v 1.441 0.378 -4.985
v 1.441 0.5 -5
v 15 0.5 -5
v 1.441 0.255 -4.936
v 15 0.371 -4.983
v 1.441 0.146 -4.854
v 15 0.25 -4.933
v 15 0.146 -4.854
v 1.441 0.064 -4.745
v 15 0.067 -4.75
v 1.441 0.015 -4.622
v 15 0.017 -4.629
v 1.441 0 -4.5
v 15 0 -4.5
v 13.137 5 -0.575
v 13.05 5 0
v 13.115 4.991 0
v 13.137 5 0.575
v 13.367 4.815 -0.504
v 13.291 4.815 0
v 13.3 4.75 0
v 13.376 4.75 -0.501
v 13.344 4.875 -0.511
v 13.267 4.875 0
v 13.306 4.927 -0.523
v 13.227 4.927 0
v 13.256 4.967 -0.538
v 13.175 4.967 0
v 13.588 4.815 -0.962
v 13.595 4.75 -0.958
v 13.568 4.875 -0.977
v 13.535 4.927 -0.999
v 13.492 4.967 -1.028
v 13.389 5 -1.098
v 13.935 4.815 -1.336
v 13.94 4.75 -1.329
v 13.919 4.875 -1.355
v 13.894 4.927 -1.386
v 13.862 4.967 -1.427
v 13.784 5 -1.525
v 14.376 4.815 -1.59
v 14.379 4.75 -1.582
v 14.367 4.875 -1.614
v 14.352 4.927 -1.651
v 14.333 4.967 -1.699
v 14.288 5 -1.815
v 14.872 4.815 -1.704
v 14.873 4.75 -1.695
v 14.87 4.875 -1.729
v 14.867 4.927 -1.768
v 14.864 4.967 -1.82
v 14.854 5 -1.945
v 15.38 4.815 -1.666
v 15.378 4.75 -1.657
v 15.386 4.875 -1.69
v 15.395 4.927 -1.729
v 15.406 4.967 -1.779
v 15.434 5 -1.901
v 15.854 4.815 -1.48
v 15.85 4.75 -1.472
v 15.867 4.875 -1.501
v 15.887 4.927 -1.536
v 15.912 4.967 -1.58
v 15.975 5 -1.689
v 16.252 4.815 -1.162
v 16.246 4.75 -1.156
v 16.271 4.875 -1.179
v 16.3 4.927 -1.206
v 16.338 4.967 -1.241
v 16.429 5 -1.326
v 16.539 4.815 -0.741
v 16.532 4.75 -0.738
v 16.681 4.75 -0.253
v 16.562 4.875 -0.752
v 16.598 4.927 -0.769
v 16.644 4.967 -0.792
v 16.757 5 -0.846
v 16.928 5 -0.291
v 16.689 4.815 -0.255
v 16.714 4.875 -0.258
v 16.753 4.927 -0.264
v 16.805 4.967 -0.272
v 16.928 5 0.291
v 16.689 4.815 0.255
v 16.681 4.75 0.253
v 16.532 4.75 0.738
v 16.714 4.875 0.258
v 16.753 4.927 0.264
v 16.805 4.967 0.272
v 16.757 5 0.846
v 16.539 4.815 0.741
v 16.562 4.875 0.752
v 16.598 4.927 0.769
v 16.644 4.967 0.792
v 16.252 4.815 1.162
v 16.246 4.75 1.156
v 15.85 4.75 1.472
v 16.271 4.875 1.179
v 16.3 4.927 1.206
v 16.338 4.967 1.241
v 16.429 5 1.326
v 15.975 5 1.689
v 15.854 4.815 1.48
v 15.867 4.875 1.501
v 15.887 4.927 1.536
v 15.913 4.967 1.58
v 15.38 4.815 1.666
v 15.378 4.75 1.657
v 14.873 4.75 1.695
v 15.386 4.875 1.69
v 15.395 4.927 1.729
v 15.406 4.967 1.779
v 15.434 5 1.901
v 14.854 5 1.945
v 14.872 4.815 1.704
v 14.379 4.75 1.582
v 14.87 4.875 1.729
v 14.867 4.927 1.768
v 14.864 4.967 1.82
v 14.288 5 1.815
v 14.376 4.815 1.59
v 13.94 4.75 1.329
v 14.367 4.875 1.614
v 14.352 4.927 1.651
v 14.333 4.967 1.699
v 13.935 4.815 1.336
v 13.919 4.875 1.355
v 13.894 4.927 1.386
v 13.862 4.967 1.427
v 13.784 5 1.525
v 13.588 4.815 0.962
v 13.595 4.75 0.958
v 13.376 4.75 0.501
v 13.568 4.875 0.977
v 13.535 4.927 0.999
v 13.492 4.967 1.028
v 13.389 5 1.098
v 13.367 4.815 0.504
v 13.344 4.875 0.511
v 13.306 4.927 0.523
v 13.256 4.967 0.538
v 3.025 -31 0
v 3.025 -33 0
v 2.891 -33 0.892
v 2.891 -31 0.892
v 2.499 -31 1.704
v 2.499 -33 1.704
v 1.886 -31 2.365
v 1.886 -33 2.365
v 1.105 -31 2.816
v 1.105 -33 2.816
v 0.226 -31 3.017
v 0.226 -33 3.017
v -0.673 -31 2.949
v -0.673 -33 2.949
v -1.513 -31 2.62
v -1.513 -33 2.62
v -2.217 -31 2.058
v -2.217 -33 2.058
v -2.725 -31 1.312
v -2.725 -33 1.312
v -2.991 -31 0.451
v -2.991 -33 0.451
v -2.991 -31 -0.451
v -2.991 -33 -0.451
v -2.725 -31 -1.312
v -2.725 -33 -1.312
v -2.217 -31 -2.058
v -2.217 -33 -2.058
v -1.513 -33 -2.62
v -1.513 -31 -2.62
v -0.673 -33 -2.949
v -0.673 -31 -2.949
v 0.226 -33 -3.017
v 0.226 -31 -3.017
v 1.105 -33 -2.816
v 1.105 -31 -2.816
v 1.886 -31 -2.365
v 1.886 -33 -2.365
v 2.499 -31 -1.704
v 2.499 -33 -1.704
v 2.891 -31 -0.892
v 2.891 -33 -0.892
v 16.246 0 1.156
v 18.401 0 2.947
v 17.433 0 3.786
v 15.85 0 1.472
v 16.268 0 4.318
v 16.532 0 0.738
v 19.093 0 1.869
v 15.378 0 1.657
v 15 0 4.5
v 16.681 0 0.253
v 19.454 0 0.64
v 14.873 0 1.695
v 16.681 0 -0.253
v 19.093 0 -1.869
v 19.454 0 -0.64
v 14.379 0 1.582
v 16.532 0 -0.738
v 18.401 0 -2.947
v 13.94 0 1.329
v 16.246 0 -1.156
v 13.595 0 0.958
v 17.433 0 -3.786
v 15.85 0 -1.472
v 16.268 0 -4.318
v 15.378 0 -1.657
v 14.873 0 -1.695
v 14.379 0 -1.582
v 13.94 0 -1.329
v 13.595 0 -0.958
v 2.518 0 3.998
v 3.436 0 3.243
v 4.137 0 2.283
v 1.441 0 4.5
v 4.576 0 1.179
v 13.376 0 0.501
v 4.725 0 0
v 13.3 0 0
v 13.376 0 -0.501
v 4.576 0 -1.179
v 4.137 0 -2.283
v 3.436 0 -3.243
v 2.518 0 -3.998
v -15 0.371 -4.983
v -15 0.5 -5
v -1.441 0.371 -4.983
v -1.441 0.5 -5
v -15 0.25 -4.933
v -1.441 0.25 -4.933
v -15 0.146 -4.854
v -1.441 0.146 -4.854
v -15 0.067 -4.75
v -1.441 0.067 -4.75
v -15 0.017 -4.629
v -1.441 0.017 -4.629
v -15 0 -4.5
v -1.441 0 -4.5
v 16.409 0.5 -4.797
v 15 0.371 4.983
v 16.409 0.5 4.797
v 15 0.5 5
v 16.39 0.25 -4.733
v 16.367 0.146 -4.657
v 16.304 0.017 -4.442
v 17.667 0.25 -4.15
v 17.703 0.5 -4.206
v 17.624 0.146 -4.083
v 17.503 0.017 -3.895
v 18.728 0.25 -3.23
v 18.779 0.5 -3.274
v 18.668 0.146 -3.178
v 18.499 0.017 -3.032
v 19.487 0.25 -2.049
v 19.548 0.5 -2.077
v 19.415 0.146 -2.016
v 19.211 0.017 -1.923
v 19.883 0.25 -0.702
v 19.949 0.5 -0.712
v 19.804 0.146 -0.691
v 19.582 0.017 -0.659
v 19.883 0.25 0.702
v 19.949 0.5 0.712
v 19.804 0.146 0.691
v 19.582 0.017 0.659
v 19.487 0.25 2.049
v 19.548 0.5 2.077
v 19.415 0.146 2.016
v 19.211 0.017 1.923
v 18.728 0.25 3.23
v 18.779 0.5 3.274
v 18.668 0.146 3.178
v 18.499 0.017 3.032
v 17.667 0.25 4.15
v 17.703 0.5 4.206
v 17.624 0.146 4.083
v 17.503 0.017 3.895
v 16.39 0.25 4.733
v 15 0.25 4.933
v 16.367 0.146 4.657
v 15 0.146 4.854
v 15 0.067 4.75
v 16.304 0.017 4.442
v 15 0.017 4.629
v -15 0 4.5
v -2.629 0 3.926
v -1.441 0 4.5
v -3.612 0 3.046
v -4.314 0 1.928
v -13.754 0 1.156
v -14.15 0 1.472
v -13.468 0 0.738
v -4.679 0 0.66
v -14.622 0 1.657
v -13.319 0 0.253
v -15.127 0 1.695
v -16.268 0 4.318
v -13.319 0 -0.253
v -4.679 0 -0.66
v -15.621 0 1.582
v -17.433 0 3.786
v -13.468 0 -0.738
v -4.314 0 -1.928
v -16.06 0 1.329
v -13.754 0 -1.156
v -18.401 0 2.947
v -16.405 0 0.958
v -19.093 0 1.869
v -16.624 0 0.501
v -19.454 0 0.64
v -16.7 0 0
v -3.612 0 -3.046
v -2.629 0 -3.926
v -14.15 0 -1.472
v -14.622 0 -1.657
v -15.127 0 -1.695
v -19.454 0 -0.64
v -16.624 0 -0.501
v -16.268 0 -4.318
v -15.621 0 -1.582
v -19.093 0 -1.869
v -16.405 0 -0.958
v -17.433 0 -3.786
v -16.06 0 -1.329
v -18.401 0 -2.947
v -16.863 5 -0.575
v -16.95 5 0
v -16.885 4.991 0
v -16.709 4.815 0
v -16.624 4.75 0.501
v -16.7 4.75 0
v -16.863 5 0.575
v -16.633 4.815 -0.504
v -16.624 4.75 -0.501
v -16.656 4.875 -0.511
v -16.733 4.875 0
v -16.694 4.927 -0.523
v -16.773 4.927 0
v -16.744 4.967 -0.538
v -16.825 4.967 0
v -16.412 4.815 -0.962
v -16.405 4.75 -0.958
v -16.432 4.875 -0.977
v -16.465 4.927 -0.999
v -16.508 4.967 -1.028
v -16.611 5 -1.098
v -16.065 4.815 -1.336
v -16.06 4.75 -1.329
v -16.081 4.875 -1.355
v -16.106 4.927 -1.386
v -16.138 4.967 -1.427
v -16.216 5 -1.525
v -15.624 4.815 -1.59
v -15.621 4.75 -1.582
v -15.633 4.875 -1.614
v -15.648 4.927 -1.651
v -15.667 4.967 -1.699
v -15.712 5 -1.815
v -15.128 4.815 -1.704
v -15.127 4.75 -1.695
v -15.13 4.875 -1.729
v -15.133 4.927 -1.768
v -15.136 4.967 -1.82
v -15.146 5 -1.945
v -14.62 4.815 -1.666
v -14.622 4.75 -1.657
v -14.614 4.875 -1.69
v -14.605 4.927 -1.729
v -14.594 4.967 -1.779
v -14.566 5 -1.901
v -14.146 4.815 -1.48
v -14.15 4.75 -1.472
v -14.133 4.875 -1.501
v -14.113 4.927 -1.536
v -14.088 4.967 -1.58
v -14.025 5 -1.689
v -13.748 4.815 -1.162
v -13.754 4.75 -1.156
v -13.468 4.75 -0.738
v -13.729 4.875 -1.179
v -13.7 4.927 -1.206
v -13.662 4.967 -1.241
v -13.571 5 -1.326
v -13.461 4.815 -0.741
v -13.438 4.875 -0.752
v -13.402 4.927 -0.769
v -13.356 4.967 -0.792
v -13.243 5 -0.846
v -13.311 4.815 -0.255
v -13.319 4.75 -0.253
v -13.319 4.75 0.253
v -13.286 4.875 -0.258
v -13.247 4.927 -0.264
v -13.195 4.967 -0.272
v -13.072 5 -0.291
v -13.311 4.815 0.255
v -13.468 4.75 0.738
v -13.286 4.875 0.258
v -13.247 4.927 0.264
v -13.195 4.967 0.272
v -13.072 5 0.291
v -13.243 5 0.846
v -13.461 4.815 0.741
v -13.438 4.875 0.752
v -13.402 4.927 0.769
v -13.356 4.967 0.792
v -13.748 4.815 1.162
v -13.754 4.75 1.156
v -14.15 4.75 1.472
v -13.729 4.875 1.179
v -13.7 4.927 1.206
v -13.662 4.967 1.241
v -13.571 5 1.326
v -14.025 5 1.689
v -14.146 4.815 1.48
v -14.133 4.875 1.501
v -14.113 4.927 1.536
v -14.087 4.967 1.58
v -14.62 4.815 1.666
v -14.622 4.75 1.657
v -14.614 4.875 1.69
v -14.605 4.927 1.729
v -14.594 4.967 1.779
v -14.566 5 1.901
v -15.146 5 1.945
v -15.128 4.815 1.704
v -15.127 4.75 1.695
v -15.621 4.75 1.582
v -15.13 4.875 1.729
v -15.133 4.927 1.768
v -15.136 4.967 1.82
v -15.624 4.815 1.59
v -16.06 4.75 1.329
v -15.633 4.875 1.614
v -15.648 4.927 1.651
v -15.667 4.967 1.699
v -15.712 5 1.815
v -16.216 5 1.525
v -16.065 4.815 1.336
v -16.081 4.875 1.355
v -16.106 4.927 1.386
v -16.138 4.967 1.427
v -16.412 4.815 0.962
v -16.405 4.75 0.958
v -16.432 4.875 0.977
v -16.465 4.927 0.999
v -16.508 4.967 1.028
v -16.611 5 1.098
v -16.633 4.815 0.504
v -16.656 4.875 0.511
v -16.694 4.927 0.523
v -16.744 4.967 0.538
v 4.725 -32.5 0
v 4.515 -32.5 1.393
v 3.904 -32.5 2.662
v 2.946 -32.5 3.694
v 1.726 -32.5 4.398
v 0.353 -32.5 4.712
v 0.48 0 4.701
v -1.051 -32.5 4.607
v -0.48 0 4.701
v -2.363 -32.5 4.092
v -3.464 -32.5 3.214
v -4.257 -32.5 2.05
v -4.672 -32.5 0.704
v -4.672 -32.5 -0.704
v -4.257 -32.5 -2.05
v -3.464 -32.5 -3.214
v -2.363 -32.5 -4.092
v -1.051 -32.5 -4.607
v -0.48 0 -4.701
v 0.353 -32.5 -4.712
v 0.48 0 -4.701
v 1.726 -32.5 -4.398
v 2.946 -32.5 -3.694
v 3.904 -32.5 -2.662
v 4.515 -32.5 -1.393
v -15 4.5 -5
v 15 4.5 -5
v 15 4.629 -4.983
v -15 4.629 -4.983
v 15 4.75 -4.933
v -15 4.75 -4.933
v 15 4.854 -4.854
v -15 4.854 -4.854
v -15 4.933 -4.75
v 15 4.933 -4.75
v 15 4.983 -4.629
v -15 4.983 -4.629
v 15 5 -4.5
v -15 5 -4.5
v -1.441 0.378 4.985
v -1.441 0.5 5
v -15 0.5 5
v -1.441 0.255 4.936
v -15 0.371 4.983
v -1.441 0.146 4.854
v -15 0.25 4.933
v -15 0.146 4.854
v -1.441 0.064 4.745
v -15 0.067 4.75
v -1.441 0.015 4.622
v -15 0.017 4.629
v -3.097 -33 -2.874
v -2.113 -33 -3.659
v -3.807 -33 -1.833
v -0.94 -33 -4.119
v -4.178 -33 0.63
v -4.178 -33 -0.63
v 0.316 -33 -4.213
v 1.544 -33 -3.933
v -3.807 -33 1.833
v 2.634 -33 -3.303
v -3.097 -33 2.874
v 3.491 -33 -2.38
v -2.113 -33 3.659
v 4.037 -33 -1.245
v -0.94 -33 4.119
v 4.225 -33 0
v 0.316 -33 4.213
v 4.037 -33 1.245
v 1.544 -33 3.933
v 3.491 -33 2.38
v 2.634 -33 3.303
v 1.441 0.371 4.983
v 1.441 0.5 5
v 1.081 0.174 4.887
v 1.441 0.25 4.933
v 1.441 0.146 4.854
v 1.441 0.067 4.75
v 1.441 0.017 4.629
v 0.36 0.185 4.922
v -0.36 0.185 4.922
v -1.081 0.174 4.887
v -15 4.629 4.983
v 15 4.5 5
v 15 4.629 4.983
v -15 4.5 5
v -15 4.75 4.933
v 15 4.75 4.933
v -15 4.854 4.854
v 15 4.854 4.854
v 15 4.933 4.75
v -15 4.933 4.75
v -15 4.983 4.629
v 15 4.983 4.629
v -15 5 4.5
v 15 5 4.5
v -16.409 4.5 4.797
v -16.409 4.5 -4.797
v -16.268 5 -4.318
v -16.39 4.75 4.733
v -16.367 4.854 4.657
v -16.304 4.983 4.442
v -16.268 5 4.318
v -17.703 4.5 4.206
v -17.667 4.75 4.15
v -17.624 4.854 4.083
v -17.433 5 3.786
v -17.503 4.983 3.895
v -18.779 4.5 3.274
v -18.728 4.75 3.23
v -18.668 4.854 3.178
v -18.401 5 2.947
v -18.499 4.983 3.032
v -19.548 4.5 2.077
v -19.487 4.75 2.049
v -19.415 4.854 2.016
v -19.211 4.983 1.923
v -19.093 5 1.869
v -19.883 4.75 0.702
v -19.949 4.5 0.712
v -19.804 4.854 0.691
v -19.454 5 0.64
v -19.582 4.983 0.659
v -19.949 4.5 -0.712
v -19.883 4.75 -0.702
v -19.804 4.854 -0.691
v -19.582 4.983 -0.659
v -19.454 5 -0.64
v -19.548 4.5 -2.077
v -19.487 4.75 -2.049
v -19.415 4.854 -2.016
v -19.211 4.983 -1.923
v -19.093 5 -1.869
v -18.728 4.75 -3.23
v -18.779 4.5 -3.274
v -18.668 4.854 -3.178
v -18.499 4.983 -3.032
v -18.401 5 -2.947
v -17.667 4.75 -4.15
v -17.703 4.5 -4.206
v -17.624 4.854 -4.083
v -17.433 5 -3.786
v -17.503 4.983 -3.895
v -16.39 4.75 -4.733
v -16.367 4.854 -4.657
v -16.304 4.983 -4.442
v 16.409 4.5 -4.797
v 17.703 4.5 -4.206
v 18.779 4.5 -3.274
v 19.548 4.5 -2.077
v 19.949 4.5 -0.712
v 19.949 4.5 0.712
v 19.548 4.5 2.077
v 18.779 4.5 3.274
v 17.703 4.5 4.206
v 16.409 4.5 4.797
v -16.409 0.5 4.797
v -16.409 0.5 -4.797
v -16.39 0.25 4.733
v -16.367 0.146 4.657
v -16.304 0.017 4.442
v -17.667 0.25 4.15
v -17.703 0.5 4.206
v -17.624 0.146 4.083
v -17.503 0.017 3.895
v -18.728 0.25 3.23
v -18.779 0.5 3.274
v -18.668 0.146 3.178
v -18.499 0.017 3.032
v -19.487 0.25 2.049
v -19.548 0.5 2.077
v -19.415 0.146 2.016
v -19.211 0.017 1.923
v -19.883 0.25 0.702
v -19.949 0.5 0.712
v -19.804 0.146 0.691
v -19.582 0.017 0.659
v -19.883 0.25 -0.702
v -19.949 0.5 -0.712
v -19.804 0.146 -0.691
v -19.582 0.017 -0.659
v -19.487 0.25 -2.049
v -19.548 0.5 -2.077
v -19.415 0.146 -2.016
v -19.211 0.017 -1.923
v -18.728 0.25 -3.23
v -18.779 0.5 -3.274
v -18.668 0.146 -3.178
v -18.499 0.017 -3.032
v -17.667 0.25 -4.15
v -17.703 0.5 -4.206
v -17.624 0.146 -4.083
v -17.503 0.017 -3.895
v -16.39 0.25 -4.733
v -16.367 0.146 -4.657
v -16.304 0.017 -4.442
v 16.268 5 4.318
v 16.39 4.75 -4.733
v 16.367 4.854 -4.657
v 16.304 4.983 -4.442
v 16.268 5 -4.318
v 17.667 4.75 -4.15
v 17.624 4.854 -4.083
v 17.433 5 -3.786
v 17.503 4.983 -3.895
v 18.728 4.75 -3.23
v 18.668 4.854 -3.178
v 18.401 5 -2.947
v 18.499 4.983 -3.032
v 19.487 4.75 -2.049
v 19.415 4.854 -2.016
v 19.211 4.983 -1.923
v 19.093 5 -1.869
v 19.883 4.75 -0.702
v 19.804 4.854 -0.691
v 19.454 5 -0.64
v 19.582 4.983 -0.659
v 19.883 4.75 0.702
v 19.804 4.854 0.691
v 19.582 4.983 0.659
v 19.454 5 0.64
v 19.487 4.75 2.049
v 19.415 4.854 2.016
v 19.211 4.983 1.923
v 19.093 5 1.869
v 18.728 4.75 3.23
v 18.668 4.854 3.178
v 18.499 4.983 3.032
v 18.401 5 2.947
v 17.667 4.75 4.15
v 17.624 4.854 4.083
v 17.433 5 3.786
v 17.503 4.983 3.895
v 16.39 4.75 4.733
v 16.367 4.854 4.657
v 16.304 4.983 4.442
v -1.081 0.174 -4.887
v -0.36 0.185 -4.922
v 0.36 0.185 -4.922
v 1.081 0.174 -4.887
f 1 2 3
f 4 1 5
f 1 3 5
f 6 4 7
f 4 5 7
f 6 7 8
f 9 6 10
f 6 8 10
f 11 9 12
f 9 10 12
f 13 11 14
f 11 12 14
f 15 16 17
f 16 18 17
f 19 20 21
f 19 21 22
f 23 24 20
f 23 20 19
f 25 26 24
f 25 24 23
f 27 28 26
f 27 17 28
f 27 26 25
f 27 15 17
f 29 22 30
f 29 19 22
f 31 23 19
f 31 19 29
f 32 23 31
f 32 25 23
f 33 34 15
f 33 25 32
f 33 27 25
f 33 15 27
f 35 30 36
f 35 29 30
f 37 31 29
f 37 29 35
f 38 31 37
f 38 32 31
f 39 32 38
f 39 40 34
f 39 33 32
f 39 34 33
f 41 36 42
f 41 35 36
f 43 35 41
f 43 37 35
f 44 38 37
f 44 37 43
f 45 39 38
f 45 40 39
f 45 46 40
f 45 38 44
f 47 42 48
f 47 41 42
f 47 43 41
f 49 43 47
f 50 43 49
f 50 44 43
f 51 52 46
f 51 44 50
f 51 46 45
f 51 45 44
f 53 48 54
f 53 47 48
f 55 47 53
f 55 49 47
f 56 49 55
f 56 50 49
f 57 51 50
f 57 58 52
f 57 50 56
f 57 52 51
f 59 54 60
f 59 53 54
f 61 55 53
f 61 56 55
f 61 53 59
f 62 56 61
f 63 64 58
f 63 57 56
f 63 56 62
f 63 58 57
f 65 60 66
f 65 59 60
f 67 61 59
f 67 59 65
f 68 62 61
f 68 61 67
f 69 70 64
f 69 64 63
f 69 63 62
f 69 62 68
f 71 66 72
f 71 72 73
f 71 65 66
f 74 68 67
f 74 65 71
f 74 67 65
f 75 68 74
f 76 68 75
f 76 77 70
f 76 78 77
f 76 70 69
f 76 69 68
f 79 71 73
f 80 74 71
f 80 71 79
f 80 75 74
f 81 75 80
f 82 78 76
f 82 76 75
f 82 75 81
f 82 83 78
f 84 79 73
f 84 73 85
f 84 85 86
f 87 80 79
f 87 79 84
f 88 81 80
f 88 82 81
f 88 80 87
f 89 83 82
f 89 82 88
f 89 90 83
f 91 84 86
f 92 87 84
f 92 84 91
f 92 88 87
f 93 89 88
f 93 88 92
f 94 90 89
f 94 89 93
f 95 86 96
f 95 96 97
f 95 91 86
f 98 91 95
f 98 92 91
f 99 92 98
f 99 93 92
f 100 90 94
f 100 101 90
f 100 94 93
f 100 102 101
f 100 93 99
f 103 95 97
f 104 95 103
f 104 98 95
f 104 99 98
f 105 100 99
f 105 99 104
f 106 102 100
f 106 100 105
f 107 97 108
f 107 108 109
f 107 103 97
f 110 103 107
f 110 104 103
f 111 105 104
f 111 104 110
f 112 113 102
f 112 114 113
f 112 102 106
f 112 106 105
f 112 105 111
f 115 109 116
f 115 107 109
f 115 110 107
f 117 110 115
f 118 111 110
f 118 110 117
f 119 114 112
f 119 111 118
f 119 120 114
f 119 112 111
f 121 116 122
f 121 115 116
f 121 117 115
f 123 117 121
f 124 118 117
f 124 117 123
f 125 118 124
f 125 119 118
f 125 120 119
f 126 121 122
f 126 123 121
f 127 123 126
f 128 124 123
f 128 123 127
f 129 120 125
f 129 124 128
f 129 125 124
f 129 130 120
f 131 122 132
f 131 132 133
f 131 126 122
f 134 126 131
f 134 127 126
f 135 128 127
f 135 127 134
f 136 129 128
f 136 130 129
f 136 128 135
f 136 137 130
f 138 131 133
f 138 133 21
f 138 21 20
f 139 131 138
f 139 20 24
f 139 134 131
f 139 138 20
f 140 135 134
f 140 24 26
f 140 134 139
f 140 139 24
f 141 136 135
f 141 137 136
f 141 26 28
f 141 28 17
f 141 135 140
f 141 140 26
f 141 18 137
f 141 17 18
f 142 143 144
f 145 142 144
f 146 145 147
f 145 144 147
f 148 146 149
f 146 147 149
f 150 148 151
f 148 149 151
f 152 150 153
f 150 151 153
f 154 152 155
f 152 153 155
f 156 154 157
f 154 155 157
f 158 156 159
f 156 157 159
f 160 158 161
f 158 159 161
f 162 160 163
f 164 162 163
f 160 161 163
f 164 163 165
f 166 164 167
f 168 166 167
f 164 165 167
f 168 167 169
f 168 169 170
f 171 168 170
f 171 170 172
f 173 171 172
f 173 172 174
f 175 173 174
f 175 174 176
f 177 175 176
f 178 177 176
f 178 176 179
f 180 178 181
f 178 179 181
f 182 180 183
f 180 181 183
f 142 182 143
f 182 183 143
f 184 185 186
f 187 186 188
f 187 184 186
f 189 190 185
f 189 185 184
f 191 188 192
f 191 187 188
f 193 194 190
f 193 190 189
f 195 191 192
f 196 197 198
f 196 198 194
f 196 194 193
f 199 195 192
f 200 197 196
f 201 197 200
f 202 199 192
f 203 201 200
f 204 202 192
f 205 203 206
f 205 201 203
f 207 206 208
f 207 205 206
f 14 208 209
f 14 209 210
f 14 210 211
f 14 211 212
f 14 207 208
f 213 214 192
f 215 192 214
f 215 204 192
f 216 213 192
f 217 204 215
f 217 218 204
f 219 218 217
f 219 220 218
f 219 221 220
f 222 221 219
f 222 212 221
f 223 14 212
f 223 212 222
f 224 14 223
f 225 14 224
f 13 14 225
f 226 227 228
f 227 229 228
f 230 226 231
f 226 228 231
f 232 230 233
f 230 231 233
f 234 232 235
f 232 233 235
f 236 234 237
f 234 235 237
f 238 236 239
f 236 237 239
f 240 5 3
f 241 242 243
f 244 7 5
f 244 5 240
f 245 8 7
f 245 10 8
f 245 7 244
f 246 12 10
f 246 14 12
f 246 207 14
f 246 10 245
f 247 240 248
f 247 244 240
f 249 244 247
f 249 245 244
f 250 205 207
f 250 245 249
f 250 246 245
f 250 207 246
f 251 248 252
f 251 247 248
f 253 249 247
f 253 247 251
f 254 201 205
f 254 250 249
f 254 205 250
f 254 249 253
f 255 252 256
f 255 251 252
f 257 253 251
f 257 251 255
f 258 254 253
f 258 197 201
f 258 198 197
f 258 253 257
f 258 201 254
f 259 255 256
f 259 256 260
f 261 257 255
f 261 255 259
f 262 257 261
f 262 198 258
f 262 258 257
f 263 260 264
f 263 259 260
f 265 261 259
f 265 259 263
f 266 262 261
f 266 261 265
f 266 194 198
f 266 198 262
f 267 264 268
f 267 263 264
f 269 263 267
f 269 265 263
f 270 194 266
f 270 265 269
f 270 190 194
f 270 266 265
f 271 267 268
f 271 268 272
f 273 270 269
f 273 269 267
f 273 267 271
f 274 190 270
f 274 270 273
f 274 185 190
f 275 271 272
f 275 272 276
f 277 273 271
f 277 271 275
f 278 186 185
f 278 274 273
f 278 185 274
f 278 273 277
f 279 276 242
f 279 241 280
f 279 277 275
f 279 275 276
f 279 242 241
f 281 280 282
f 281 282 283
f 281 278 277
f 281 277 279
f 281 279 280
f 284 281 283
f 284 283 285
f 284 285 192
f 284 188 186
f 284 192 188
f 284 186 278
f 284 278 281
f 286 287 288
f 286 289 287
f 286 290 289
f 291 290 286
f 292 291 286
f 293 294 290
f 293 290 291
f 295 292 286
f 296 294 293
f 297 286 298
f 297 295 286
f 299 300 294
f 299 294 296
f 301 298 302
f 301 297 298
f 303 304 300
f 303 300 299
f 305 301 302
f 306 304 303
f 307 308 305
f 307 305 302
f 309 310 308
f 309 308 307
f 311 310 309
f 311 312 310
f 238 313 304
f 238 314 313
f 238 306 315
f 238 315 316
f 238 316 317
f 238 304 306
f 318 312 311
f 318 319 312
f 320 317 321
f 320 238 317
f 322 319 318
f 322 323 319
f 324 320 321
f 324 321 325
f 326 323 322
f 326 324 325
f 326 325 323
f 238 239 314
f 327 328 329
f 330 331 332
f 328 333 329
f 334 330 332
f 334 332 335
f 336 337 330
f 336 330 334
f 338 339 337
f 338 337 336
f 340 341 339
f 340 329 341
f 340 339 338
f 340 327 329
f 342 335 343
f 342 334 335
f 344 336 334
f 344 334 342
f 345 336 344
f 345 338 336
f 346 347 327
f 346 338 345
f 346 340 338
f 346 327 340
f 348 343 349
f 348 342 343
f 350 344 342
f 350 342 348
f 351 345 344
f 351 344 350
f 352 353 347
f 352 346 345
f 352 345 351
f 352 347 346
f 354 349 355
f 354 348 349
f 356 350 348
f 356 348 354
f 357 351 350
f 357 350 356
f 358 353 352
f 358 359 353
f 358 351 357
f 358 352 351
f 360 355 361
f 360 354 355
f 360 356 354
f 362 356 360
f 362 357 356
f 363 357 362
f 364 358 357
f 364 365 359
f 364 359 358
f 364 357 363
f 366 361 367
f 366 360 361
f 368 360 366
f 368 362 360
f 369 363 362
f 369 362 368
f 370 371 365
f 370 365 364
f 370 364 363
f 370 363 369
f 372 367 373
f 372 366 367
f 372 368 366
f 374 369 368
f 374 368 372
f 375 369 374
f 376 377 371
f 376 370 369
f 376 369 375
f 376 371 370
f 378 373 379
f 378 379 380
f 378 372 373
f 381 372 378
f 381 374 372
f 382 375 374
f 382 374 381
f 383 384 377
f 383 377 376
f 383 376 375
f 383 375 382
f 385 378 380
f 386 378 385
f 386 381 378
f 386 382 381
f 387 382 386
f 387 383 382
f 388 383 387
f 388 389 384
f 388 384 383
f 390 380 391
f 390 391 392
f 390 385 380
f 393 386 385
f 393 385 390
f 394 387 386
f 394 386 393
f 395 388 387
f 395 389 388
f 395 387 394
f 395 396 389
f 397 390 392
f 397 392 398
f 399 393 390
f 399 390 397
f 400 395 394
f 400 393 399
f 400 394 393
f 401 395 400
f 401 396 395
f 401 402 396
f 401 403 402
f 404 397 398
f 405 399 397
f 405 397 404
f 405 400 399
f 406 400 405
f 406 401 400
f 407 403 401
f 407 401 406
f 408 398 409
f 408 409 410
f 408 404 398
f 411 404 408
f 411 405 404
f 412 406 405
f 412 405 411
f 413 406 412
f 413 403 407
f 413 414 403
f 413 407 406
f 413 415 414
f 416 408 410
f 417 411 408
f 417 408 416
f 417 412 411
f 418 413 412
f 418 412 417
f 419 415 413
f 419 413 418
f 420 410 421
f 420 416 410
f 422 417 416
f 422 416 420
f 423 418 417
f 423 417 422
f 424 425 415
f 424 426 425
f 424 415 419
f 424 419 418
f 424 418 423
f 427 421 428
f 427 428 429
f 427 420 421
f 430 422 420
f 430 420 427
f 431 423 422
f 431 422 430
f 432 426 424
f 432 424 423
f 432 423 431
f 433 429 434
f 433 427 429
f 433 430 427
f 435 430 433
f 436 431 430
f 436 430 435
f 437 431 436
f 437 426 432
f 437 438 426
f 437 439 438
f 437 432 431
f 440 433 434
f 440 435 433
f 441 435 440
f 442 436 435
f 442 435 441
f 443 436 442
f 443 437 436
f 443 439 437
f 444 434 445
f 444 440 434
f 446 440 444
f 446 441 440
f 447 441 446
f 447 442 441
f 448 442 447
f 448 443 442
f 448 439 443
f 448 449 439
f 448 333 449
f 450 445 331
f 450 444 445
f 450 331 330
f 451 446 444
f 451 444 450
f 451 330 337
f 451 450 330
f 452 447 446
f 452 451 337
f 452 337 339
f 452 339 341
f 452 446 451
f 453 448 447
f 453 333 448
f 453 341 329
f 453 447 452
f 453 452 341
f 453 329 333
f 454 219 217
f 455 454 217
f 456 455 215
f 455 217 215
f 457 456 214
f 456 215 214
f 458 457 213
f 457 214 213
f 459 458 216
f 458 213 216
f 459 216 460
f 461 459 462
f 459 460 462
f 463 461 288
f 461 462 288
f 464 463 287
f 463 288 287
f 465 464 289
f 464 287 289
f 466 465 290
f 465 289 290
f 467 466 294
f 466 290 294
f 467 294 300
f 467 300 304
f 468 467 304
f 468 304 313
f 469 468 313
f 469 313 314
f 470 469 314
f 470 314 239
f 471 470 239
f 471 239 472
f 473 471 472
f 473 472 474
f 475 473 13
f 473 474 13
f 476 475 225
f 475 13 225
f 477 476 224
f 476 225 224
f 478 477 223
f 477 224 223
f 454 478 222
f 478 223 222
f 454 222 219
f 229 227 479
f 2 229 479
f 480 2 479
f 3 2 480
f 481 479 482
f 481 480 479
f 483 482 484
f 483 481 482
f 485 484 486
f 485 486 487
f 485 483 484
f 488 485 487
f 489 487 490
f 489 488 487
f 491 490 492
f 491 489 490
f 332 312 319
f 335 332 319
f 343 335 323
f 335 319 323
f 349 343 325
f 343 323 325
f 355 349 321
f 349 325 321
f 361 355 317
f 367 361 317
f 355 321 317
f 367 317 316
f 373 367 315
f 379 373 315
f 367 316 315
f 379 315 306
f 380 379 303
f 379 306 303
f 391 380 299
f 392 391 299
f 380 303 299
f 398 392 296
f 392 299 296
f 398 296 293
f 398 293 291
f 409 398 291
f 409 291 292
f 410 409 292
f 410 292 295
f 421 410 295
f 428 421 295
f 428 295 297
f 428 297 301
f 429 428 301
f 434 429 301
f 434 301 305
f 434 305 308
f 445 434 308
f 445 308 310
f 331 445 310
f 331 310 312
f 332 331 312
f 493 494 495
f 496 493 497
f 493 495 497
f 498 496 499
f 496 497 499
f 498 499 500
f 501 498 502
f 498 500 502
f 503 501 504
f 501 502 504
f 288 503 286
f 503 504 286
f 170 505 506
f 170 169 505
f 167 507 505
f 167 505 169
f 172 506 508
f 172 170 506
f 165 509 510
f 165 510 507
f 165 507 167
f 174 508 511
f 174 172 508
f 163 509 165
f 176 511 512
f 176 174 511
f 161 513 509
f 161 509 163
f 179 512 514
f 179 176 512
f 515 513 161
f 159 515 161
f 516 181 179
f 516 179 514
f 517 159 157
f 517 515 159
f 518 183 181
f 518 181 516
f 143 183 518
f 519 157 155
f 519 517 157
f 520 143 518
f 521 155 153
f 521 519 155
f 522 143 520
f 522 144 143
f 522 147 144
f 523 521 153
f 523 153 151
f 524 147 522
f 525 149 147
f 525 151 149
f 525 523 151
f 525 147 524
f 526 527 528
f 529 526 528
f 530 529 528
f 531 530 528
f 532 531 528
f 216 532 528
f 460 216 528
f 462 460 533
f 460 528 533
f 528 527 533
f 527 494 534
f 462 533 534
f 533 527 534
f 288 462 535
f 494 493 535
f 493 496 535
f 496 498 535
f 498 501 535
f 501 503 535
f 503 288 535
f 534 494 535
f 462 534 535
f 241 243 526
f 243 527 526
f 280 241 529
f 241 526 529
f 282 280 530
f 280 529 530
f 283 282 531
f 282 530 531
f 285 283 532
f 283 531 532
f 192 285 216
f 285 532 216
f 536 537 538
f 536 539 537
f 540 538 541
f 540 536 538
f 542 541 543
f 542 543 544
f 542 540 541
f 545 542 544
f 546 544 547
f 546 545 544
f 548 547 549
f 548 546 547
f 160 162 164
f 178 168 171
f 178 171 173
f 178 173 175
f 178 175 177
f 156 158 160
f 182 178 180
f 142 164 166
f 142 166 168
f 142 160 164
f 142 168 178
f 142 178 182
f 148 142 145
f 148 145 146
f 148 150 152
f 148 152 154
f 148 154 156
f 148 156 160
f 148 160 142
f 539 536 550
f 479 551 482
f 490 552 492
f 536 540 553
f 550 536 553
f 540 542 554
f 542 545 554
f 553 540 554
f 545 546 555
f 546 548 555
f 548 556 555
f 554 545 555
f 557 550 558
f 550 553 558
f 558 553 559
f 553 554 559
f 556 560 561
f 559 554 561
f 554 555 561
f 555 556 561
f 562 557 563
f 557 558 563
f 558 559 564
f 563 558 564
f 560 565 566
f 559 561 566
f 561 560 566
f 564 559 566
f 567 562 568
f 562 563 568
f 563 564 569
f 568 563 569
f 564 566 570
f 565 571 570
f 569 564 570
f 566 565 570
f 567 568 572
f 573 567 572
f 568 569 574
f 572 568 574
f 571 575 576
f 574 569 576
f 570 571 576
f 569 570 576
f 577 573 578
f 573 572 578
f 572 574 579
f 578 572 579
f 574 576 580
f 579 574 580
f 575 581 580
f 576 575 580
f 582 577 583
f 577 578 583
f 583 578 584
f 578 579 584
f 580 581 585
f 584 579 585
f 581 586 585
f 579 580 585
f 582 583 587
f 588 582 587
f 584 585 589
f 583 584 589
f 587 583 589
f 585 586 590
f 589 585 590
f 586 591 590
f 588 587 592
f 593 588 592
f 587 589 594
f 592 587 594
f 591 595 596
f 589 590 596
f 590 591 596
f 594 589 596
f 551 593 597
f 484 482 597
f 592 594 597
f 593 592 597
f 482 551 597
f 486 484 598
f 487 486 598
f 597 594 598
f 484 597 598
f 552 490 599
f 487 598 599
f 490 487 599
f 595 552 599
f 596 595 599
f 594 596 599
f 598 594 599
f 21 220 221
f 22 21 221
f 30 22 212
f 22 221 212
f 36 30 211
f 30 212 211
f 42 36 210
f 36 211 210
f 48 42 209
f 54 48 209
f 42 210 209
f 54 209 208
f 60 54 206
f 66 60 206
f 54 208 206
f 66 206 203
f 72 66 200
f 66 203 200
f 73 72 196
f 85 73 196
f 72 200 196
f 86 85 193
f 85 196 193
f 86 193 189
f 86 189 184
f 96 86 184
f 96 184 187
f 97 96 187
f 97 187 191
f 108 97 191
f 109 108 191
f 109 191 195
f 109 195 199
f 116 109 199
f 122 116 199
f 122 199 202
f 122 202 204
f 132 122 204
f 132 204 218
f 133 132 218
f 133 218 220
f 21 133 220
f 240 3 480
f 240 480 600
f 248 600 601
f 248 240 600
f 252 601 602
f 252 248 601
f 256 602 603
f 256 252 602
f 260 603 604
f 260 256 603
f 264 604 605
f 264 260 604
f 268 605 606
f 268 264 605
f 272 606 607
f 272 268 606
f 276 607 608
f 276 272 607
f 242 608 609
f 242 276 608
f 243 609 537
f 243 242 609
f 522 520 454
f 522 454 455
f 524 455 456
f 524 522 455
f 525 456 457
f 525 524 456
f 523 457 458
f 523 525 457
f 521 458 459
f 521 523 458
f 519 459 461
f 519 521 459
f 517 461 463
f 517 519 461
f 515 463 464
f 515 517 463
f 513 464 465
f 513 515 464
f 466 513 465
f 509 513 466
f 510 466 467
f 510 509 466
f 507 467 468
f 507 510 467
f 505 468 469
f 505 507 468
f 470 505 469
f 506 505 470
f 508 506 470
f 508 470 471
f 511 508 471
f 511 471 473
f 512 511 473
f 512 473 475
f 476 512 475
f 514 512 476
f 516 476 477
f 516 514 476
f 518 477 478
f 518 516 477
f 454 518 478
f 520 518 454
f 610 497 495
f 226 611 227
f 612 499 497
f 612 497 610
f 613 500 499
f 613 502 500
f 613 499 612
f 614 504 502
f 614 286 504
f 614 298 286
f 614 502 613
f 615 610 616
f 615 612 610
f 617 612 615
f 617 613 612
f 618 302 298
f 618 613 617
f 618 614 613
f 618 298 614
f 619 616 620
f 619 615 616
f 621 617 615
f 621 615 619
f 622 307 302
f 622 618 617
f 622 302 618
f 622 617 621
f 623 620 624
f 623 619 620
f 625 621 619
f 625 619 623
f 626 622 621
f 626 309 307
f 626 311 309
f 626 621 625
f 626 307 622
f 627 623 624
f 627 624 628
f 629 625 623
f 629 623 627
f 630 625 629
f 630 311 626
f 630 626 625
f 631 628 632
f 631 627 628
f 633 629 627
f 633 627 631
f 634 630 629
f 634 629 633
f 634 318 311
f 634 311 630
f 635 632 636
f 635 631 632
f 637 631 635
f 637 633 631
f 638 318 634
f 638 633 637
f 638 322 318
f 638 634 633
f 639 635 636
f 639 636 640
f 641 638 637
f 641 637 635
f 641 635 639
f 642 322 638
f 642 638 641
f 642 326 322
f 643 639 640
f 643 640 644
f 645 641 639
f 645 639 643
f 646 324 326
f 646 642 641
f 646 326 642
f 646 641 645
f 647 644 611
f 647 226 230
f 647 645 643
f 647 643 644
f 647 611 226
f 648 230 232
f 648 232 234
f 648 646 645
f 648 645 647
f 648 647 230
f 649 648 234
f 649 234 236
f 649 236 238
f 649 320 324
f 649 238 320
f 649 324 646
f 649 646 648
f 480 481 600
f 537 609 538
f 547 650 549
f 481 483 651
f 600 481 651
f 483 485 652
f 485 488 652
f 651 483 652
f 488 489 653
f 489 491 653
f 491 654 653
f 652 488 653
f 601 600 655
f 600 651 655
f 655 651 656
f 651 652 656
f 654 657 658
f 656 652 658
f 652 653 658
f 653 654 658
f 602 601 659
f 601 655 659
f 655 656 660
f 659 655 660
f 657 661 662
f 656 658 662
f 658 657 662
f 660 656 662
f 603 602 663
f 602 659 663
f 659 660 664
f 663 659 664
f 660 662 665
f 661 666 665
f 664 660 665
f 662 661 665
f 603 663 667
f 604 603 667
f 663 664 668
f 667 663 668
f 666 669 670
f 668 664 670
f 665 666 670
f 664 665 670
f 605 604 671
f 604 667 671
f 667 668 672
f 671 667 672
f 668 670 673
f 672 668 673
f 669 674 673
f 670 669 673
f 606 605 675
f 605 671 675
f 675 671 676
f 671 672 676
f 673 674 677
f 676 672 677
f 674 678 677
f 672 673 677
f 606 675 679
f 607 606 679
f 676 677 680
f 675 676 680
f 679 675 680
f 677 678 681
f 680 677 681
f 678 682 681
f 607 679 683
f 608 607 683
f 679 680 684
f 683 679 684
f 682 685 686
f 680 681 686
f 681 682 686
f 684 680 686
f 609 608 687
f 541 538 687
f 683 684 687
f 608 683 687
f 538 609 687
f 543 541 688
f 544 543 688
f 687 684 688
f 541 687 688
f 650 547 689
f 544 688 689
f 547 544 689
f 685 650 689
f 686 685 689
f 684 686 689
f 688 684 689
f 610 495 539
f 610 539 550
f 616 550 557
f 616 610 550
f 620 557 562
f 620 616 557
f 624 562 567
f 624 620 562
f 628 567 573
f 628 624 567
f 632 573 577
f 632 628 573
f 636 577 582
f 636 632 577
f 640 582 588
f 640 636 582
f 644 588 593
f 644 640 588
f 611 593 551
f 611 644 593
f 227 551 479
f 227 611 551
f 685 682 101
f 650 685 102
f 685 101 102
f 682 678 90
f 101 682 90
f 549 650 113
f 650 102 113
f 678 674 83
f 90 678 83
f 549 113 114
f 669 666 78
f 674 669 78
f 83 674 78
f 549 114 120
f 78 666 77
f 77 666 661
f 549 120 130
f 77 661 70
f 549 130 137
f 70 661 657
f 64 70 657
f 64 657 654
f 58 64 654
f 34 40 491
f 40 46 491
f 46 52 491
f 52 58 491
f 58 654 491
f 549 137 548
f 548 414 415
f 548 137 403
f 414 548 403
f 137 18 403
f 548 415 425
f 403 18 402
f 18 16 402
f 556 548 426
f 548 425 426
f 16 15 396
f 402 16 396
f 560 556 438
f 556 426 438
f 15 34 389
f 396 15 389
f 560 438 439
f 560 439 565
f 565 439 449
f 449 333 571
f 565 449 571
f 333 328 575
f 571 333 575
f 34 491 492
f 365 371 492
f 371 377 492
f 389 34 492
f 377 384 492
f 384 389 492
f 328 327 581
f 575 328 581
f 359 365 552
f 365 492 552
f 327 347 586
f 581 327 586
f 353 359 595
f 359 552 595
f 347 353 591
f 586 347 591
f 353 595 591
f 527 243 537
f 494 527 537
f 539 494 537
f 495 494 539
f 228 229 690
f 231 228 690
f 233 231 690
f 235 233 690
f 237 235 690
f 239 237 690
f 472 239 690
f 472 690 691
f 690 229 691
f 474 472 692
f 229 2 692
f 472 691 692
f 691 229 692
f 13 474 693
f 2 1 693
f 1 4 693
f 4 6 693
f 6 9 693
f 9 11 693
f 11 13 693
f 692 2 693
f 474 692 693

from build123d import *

# Parameters (mm, degrees)
BOSS_EXTRUDE1_DEPTH      = 5
M3_CLEARANCE_HOLE1_D     = 3.4
M3_CLEARANCE_HOLE1_DEPTH = 5
M3_CLEARANCE_HOLE1_TIP   = 1.021463052
SKETCH4_R                = 4.725
BOSS_EXTRUDE2_DEPTH      = 33
SKETCH5_R                = 3.025
CUT_EXTRUDE1_DEPTH       = 2
FILLET1_R                = 0.5
CHAMFER1_SIZE            = 0.5
FILLET2_R                = 0.25


with BuildPart() as part:
    # Sketch1 → Boss-Extrude1 (new body)
    with BuildSketch(Plane(origin=(0, 0, 0), x_dir=(1, 0, 0), z_dir=(0, 1, 0))):
        with BuildLine():
            Line((-15, 5), (15, 5))
            ThreePointArc((15, 5), (20, 0), (15, -5))
            Line((15, -5), (-15, -5))
            ThreePointArc((-15, -5), (-20, 0), (-15, 5))
        make_face()
    extrude(amount=BOSS_EXTRUDE1_DEPTH)

    # M3 Clearance Hole1
    with Locations(Plane(origin=(0, 5, 0), x_dir=(1, 0, 0), z_dir=(0, 1, 0))):
        with Locations((-15, 0), (15, 0)):
            Hole(M3_CLEARANCE_HOLE1_D / 2, depth=M3_CLEARANCE_HOLE1_DEPTH)
            with Locations((0, 0, -(M3_CLEARANCE_HOLE1_DEPTH + M3_CLEARANCE_HOLE1_TIP / 2))):  # 118° drill point
                Cone(0, M3_CLEARANCE_HOLE1_D / 2, M3_CLEARANCE_HOLE1_TIP, mode=Mode.SUBTRACT)

    # Sketch4 → Boss-Extrude2 (add)
    with BuildSketch(Plane.XZ):
        Circle(SKETCH4_R)
    extrude(amount=BOSS_EXTRUDE2_DEPTH)

    # Sketch5 → Cut-Extrude1 (cut)
    with BuildSketch(Plane.XZ.offset(33)):
        Circle(SKETCH5_R)
    extrude(amount=-CUT_EXTRUDE1_DEPTH, mode=Mode.SUBTRACT)

    # Fillet1
    fillet1_edges = [part.edges().sort_by_distance(p)[0] for p in [
        (20, 5, 0),
        (0, 5, -5),
        (-20, 5, 0),
        (0, 0, -5),
        (20, 0, 0),
        (0, 0, 5),
        (-20, 0, 0),
        (0, 5, 5),
    ]]
    fillet(fillet1_edges, radius=FILLET1_R)

    # Chamfer1
    chamfer1_edges = [part.edges().sort_by_distance(p)[0] for p in [
        (-4.725, -33, 0),
    ]]
    chamfer(chamfer1_edges, length=CHAMFER1_SIZE)

    # Fillet2
    fillet2_edges = [part.edges().sort_by_distance(p)[0] for p in [
        (16.7, 5, 0),
        (-13.3, 5, 0),
    ]]
    fillet(fillet2_edges, radius=FILLET2_R)


solid = part.part
